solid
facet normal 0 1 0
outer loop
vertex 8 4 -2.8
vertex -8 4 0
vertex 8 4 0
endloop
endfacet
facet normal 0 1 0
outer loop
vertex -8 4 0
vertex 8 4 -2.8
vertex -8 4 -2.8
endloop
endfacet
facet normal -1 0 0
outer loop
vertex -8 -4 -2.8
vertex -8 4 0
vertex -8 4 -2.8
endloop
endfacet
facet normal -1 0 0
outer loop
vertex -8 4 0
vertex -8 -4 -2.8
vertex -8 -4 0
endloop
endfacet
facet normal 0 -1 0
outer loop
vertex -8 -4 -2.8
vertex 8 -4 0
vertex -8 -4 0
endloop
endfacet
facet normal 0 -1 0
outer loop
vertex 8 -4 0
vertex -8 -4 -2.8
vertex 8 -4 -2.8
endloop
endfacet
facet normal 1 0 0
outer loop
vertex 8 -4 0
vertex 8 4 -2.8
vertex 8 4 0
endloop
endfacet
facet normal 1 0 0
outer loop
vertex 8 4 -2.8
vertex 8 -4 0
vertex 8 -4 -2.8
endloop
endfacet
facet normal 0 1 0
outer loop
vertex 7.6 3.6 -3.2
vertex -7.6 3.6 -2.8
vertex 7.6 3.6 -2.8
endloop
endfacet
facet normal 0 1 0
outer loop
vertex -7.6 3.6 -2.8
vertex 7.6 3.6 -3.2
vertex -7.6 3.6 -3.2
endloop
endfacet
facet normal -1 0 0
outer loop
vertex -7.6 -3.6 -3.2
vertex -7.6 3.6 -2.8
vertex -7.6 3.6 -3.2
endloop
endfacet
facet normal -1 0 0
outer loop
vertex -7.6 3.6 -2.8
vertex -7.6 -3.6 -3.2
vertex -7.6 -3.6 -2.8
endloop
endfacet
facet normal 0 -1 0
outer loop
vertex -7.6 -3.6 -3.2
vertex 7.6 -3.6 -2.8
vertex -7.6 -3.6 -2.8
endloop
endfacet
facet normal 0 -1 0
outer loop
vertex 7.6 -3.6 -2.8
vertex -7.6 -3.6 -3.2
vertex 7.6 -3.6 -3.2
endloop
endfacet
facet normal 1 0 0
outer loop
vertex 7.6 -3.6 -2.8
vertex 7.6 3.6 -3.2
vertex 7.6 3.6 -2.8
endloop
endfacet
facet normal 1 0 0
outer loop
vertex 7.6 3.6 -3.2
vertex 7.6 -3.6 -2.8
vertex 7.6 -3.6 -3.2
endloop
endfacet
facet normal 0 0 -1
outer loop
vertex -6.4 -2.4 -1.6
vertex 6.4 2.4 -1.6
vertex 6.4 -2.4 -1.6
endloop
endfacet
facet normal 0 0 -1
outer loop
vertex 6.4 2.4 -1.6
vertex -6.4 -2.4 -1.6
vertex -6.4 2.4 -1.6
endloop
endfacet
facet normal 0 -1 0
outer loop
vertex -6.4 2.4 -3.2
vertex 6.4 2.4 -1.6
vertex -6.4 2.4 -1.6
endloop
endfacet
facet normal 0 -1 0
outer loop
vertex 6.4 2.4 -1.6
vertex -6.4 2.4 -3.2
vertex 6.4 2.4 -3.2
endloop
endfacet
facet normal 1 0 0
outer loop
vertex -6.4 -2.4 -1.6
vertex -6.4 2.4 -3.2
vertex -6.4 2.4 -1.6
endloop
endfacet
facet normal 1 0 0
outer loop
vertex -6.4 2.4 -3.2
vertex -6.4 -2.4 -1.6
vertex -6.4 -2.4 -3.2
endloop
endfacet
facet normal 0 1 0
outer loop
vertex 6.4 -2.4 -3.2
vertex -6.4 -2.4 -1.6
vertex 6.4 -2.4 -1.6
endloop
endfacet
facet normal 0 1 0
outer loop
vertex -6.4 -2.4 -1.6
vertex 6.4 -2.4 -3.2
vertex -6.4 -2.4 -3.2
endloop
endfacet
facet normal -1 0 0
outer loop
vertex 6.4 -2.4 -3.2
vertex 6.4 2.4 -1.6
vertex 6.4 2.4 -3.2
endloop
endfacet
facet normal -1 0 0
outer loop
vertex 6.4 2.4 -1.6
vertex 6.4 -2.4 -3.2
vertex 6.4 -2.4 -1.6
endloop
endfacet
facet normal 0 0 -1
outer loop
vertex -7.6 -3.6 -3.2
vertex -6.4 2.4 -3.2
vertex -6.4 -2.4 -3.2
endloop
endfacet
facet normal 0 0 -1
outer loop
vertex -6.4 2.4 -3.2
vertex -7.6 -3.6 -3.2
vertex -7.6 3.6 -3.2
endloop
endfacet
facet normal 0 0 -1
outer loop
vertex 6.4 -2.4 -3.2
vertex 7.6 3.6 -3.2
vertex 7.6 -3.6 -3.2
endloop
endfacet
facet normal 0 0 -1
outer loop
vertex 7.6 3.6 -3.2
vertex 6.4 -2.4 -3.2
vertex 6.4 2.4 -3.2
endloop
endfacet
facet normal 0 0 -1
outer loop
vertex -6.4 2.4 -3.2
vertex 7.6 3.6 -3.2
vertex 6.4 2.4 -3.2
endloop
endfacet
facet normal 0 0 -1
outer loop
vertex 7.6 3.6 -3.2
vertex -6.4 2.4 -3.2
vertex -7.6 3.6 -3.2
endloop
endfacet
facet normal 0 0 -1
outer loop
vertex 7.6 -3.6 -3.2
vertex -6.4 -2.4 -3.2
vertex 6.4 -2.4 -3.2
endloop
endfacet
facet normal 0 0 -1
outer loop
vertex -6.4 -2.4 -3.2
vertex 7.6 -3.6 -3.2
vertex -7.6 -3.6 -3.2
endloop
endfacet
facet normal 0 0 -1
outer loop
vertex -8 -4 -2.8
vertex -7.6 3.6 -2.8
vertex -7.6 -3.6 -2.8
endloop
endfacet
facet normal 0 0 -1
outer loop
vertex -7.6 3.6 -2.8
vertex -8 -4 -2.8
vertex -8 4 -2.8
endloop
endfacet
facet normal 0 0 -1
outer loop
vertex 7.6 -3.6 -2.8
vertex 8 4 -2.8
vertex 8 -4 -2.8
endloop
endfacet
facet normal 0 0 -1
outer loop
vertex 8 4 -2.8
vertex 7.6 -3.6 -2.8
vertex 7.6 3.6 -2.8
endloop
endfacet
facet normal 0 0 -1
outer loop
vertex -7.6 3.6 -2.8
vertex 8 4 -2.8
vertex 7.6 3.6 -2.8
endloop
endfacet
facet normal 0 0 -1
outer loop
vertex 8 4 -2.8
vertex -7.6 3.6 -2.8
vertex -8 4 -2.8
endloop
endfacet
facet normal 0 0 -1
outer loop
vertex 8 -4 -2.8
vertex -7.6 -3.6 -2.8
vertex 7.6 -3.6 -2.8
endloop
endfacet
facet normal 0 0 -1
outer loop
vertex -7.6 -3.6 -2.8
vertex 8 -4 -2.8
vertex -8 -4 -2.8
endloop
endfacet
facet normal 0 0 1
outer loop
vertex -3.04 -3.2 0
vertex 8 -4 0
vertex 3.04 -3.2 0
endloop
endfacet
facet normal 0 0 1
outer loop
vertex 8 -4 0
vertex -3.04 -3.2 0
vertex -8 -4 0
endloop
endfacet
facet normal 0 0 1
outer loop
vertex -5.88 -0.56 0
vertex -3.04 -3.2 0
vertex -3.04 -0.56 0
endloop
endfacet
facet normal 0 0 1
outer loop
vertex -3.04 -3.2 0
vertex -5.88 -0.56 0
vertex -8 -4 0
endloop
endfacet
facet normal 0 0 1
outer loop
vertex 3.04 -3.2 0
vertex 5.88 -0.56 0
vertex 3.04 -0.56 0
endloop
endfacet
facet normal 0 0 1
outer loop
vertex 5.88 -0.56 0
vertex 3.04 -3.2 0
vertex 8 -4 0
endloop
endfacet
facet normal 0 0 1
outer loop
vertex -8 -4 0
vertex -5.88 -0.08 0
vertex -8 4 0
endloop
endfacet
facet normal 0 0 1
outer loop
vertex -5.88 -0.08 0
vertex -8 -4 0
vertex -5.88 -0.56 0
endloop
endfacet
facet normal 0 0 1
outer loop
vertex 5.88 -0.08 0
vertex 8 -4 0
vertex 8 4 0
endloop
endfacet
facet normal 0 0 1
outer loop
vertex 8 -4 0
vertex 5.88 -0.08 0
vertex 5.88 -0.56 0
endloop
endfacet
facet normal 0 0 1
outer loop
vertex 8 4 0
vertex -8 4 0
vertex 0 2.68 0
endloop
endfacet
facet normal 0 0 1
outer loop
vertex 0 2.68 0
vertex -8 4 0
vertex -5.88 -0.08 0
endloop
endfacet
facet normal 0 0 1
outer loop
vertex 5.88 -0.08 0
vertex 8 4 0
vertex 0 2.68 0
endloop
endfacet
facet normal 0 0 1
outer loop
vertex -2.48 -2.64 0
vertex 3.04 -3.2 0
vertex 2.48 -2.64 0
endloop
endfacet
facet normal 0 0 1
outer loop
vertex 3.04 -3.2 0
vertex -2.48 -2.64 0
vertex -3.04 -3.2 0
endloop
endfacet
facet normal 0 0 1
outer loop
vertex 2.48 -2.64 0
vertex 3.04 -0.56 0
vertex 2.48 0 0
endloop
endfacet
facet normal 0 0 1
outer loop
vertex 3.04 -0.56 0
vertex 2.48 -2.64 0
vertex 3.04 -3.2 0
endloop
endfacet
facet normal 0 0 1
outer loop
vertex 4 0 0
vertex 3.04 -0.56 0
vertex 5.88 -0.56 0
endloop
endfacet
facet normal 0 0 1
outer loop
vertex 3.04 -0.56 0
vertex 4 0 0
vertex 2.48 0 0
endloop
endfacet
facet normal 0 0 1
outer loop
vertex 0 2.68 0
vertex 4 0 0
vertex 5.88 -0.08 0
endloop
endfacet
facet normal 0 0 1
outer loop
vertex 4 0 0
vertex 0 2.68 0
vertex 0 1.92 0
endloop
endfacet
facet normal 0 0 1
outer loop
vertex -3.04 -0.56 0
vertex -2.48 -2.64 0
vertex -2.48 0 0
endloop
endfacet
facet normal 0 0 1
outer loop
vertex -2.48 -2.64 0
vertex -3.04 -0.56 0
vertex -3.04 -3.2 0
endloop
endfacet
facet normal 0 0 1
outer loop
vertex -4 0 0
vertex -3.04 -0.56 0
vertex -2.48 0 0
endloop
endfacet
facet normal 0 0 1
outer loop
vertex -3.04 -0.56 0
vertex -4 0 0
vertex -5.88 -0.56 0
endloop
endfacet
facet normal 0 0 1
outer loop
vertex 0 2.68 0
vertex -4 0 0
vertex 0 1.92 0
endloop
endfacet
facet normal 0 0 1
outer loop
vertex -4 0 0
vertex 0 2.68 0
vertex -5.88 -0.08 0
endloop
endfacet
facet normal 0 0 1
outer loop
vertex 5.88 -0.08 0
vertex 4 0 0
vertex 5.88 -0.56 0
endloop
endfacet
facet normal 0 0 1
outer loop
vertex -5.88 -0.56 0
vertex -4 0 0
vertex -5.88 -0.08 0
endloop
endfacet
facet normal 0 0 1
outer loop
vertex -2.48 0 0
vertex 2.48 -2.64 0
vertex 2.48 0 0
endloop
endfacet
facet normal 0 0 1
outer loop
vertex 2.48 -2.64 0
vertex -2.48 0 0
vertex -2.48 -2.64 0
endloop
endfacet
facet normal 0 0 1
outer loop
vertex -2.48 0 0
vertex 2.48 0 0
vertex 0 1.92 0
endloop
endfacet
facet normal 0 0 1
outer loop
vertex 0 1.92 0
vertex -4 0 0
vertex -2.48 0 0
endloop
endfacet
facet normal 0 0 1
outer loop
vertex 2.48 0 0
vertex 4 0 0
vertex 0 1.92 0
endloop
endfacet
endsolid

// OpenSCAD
// file: ../p/box5.scad
use <../lib.scad>
function ldraw_lib__box5() = [
// 0 Box with 5 Faces and All Edges
// 0 Name: box5.dat
// 0 Author: James Jessiman
// 0 !LDRAW_ORG Primitive UPDATE 2012-01
// 0 !LICENSE Licensed under CC BY 2.0 and CC BY 4.0 : see CAreadme.txt
// 
// 0 BFC CERTIFY CCW
  [0,"BFC","CERTIFY"],
  [0,"BFC","CCW"],
// 
// 0 !HISTORY 2002-04-03 [sbliss] Modified for BFC compliance
// 0 !HISTORY 2002-04-25 [PTadmin] Official Update 2002-02
// 0 !HISTORY 2007-06-24 [PTadmin] Header formatted for Contributor Agreement
// 0 !HISTORY 2008-07-01 [PTadmin] Official Update 2008-01
// 0 !HISTORY 2012-02-16 [Philo] Changed to CCW
// 0 !HISTORY 2012-03-30 [PTadmin] Official Update 2012-01
// 
// 
// 2 24 1 1 1 -1 1 1
  [2,24,1,1,1,-1,1,1],
// 2 24 -1 1 1 -1 1 -1
  [2,24,-1,1,1,-1,1,-1],
// 2 24 -1 1 -1 1 1 -1
  [2,24,-1,1,-1,1,1,-1],
// 2 24 1 1 -1 1 1 1
  [2,24,1,1,-1,1,1,1],
// 2 24 1 0 1 -1 0 1
  [2,24,1,0,1,-1,0,1],
// 2 24 -1 0 1 -1 0 -1
  [2,24,-1,0,1,-1,0,-1],
// 2 24 -1 0 -1 1 0 -1
  [2,24,-1,0,-1,1,0,-1],
// 2 24 1 0 -1 1 0 1
  [2,24,1,0,-1,1,0,1],
// 2 24 1 0 1 1 1 1
  [2,24,1,0,1,1,1,1],
// 2 24 -1 0 1 -1 1 1
  [2,24,-1,0,1,-1,1,1],
// 2 24 1 0 -1 1 1 -1
  [2,24,1,0,-1,1,1,-1],
// 2 24 -1 0 -1 -1 1 -1
  [2,24,-1,0,-1,-1,1,-1],
// 4 16 -1 1 1 1 1 1 1 1 -1 -1 1 -1
  [4,16,-1,1,1,1,1,1,1,1,-1,-1,1,-1],
// 4 16 -1 1 1 -1 0 1 1 0 1 1 1 1
  [4,16,-1,1,1,-1,0,1,1,0,1,1,1,1],
// 4 16 -1 1 -1 -1 0 -1 -1 0 1 -1 1 1
  [4,16,-1,1,-1,-1,0,-1,-1,0,1,-1,1,1],
// 4 16 1 1 -1 1 0 -1 -1 0 -1 -1 1 -1
  [4,16,1,1,-1,1,0,-1,-1,0,-1,-1,1,-1],
// 4 16 1 1 1 1 0 1 1 0 -1 1 1 -1
  [4,16,1,1,1,1,0,1,1,0,-1,1,1,-1],
];
makepoly(ldraw_lib__box5(), line=0.2);
// file: ../p/box4.scad
use <../lib.scad>
function ldraw_lib__box4() = [
// 0 Box with 4 Faces (2 Parallel Pairs) and All Edges
// 0 Name: box4.dat
// 0 Author: James Jessiman
// 0 !LDRAW_ORG Primitive UPDATE 2012-01
// 0 !LICENSE Licensed under CC BY 2.0 and CC BY 4.0 : see CAreadme.txt
// 
// 0 BFC CERTIFY CCW
  [0,"BFC","CERTIFY"],
  [0,"BFC","CCW"],
// 
// 0 !HISTORY 2002-04-03 [sbliss] Modified for BFC compliance
// 0 !HISTORY 2002-04-25 [PTadmin] Official Update 2002-02
// 0 !HISTORY 2007-06-24 [PTadmin] Header formatted for Contributor Agreement
// 0 !HISTORY 2008-07-01 [PTadmin] Official Update 2008-01
// 0 !HISTORY 2012-02-16 [Philo] Changed to CCW
// 0 !HISTORY 2012-03-30 [PTadmin] Official Update 2012-01
// 
// 
// 2 24 1 1 1 -1 1 1
  [2,24,1,1,1,-1,1,1],
// 2 24 -1 1 1 -1 1 -1
  [2,24,-1,1,1,-1,1,-1],
// 2 24 -1 1 -1 1 1 -1
  [2,24,-1,1,-1,1,1,-1],
// 2 24 1 1 -1 1 1 1
  [2,24,1,1,-1,1,1,1],
// 2 24 1 0 1 -1 0 1
  [2,24,1,0,1,-1,0,1],
// 2 24 -1 0 1 -1 0 -1
  [2,24,-1,0,1,-1,0,-1],
// 2 24 -1 0 -1 1 0 -1
  [2,24,-1,0,-1,1,0,-1],
// 2 24 1 0 -1 1 0 1
  [2,24,1,0,-1,1,0,1],
// 2 24 1 0 1 1 1 1
  [2,24,1,0,1,1,1,1],
// 2 24 -1 0 1 -1 1 1
  [2,24,-1,0,1,-1,1,1],
// 2 24 1 0 -1 1 1 -1
  [2,24,1,0,-1,1,1,-1],
// 2 24 -1 0 -1 -1 1 -1
  [2,24,-1,0,-1,-1,1,-1],
// 4 16 -1 1 1 -1 0 1 1 0 1 1 1 1
  [4,16,-1,1,1,-1,0,1,1,0,1,1,1,1],
// 4 16 -1 1 -1 -1 0 -1 -1 0 1 -1 1 1
  [4,16,-1,1,-1,-1,0,-1,-1,0,1,-1,1,1],
// 4 16 1 1 -1 1 0 -1 -1 0 -1 -1 1 -1
  [4,16,1,1,-1,1,0,-1,-1,0,-1,-1,1,-1],
// 4 16 1 1 1 1 0 1 1 0 -1 1 1 -1
  [4,16,1,1,1,1,0,1,1,0,-1,1,1,-1],
];
makepoly(ldraw_lib__box4(), line=0.2);
// file: s/3069p13c.scad
use <../../lib.scad>
function ldraw_lib__s__3069p13c() = [
// 0 ~Tile  1 x  2 with Arrow Short Pattern - Arrow
// 0 Name: s\3069p13c.dat
// 0 Author: Alex Taylor [anathema]
// 0 !LDRAW_ORG Subpart UPDATE 2010-02
// 0 !LICENSE Licensed under CC BY 2.0 and CC BY 4.0 : see CAreadme.txt
// 
// 0 BFC CERTIFY CCW
  [0,"BFC","CERTIFY"],
  [0,"BFC","CCW"],
// 
// 0 !HISTORY 2010-07-05 [PTadmin] Official Update 2010-02
// 
// 
// 4 16 -6.2 0 -6.6 6.2 0 -6.6 6.2 0 0 -6.2 0 0
  [4,16,-6.2,0,-6.6,6.2,0,-6.6,6.2,0,0,-6.2,0,0],
// 3 16 -6.2 0 0 6.2 0 0 0 0 4.8
  [3,16,-6.2,0,0,6.2,0,0,0,0,4.8],
// 3 16 0 0 4.8 -10 0 0 -6.2 0 0
  [3,16,0,0,4.8,-10,0,0,-6.2,0,0],
// 3 16 6.2 0 0 10 0 0 0 0 4.8
  [3,16,6.2,0,0,10,0,0,0,0,4.8],
// 0
];
makepoly(ldraw_lib__s__3069p13c(), line=0.2);
// file: s/3069p13b.scad
use <../../lib.scad>
function ldraw_lib__s__3069p13b() = [
// 0 ~Tile  1 x  2 with Arrow Short Pattern - Border
// 0 Name: s\3069p13b.dat
// 0 Author: Alex Taylor [anathema]
// 0 !LDRAW_ORG Subpart UPDATE 2010-02
// 0 !LICENSE Licensed under CC BY 2.0 and CC BY 4.0 : see CAreadme.txt
// 
// 0 BFC CERTIFY CCW
  [0,"BFC","CERTIFY"],
  [0,"BFC","CCW"],
// 
// 0 !HISTORY 2010-07-05 [PTadmin] Official Update 2010-02
// 
// 
// 4 16 -7.6 0 -8 7.6 0 -8 6.2 0 -6.6 -6.2 0 -6.6
  [4,16,-7.6,0,-8,7.6,0,-8,6.2,0,-6.6,-6.2,0,-6.6],
// 4 16 6.2 0 0 6.2 0 -6.6 7.6 0 -8 7.6 0 -1.4
  [4,16,6.2,0,0,6.2,0,-6.6,7.6,0,-8,7.6,0,-1.4],
// 4 16 7.6 0 -1.4 14.7 0 -1.4 10 0 0 6.2 0 0
  [4,16,7.6,0,-1.4,14.7,0,-1.4,10,0,0,6.2,0,0],
// 4 16 0 0 4.8 10 0 0 14.7 0 -0.2 0 0 6.7
  [4,16,0,0,4.8,10,0,0,14.7,0,-0.2,0,0,6.7],
// 4 16 -7.6 0 -1.4 -7.6 0 -8 -6.2 0 -6.6 -6.2 0 0
  [4,16,-7.6,0,-1.4,-7.6,0,-8,-6.2,0,-6.6,-6.2,0,0],
// 4 16 -6.2 0 0 -10 0 0 -14.7 0 -1.4 -7.6 0 -1.4
  [4,16,-6.2,0,0,-10,0,0,-14.7,0,-1.4,-7.6,0,-1.4],
// 4 16 0 0 6.7 -14.7 0 -0.2 -10 0 0 0 0 4.8
  [4,16,0,0,6.7,-14.7,0,-0.2,-10,0,0,0,0,4.8],
// 3 16 14.7 0 -0.2 10 0 0 14.7 0 -1.4
  [3,16,14.7,0,-0.2,10,0,0,14.7,0,-1.4],
// 3 16 -14.7 0 -1.4 -10 0 0 -14.7 0 -0.2
  [3,16,-14.7,0,-1.4,-10,0,0,-14.7,0,-0.2],
// 0
];
makepoly(ldraw_lib__s__3069p13b(), line=0.2);
// file: s/3069p13a.scad
use <../../lib.scad>
function ldraw_lib__s__3069p13a() = [
// 0 ~Tile  1 x  2 with Arrow Short Pattern - Mask
// 0 Name: s\3069p13a.dat
// 0 Author: Alex Taylor [anathema]
// 0 !LDRAW_ORG Subpart UPDATE 2010-02
// 0 !LICENSE Licensed under CC BY 2.0 and CC BY 4.0 : see CAreadme.txt
// 
// 0 BFC CERTIFY CCW
  [0,"BFC","CERTIFY"],
  [0,"BFC","CCW"],
// 
// 0 !HISTORY 2010-07-05 [PTadmin] Official Update 2010-02
// 
// 
// 4 16 -20 0 -10 20 0 -10 7.6 0 -8 -7.6 0 -8
  [4,16,-20,0,-10,20,0,-10,7.6,0,-8,-7.6,0,-8],
// 4 16 -7.6 0 -8 -7.6 0 -1.4 -14.7 0 -1.4 -20 0 -10
  [4,16,-7.6,0,-8,-7.6,0,-1.4,-14.7,0,-1.4,-20,0,-10],
// 4 16 20 0 -10 14.7 0 -1.4 7.6 0 -1.4 7.6 0 -8
  [4,16,20,0,-10,14.7,0,-1.4,7.6,0,-1.4,7.6,0,-8],
// 4 16 -20 0 -10 -14.7 0 -1.4 -14.7 0 -0.2 -20 0 10
  [4,16,-20,0,-10,-14.7,0,-1.4,-14.7,0,-0.2,-20,0,10],
// 4 16 20 0 10 14.7 0 -0.2 14.7 0 -1.4 20 0 -10
  [4,16,20,0,10,14.7,0,-0.2,14.7,0,-1.4,20,0,-10],
// 3 16 20 0 10 -20 0 10 0 0 6.7
  [3,16,20,0,10,-20,0,10,0,0,6.7],
// 3 16 0 0 6.7 -20 0 10 -14.7 0 -0.2
  [3,16,0,0,6.7,-20,0,10,-14.7,0,-0.2],
// 3 16 14.7 0 -0.2 20 0 10 0 0 6.7
  [3,16,14.7,0,-0.2,20,0,10,0,0,6.7],
// 0
];
makepoly(ldraw_lib__s__3069p13a(), line=0.2);
// file: s/3069bs01.scad
use <../../lib.scad>
use <../../p/box4.scad>
use <../../p/box5.scad>
function ldraw_lib__s__3069bs01() = [
// 0 ~Tile  1 x  2 with Groove without Top Face
// 0 Name: s\3069bs01.dat
// 0 Author: Santeri Piippo [arezey]
// 0 !LDRAW_ORG Subpart UPDATE 2010-02
// 0 !LICENSE Licensed under CC BY 2.0 and CC BY 4.0 : see CAreadme.txt
// 
// 0 BFC CERTIFY CCW
  [0,"BFC","CERTIFY"],
  [0,"BFC","CCW"],
// 
// 0 !HISTORY 2010-07-05 [PTadmin] Official Update 2010-02
// 
// 
// 1 16 0 0 0 20 0 0 0 7 0 0 0 10 box4.dat
  [1,16,0,0,0,20,0,0,0,7,0,0,0,10, ldraw_lib__box4()],
// 1 16 0 7 0 19 0 0 0 1 0 0 0 9 box4.dat
  [1,16,0,7,0,19,0,0,0,1,0,0,0,9, ldraw_lib__box4()],
// 0 BFC INVERTNEXT
  [0,"BFC","INVERTNEXT"],
// 1 16 0 8 0 16 0 0 0 -4 0 0 0 6 box5.dat
  [1,16,0,8,0,16,0,0,0,-4,0,0,0,6, ldraw_lib__box5()],
// 4 16 -19 8 9 -16 8 6 -16 8 -6 -19 8 -9
  [4,16,-19,8,9,-16,8,6,-16,8,-6,-19,8,-9],
// 4 16 19 8 -9 16 8 -6 16 8 6 19 8 9
  [4,16,19,8,-9,16,8,-6,16,8,6,19,8,9],
// 4 16 19 8 9 16 8 6 -16 8 6 -19 8 9
  [4,16,19,8,9,16,8,6,-16,8,6,-19,8,9],
// 4 16 -19 8 -9 -16 8 -6 16 8 -6 19 8 -9
  [4,16,-19,8,-9,-16,8,-6,16,8,-6,19,8,-9],
// 4 16 -20 7 10 -19 7 9 -19 7 -9 -20 7 -10
  [4,16,-20,7,10,-19,7,9,-19,7,-9,-20,7,-10],
// 4 16 20 7 -10 19 7 -9 19 7 9 20 7 10
  [4,16,20,7,-10,19,7,-9,19,7,9,20,7,10],
// 4 16 20 7 10 19 7 9 -19 7 9 -20 7 10
  [4,16,20,7,10,19,7,9,-19,7,9,-20,7,10],
// 4 16 -20 7 -10 -19 7 -9 19 7 -9 20 7 -10
  [4,16,-20,7,-10,-19,7,-9,19,7,-9,20,7,-10],
// 0 //
];
makepoly(ldraw_lib__s__3069bs01(), line=0.2);
// main file
use <../lib.scad>
use <s/3069bs01.scad>
use <s/3069p13a.scad>
use <s/3069p13b.scad>
use <s/3069p13c.scad>
function ldraw_lib__3069bp15() = [
// 0 Tile  1 x  2 with Arrow Short DkRed with Silver Border Pattern
// 0 Name: 3069bp15.dat
// 0 Author: James Jessiman
// 0 !LDRAW_ORG Part UPDATE 2013-01
// 0 !LICENSE Licensed under CC BY 2.0 and CC BY 4.0 : see CAreadme.txt
// 
// 0 BFC CERTIFY CCW
  [0,"BFC","CERTIFY"],
  [0,"BFC","CCW"],
// 
// 0 !HISTORY 2007-06-13 [PTadmin] Header formatted for Contributor Agreement
// 0 !HISTORY 2008-07-01 [PTadmin] Official Update 2008-01
// 0 !HISTORY 2009-08-15 [anathema] Rebuilt using new subparts
// 0 !HISTORY 2009-08-19 [PTadmin] Renamed from 3069p15
// 0 !HISTORY 2010-07-05 [PTadmin] Official Update 2010-02
// 0 !HISTORY 2013-02-17 [MagFors] Changed colour 179 to 80 (printed silver)
// 0 !HISTORY 2013-07-21 [PTadmin] Official Update 2013-01
// 
// 
// 1 16 0 0 0 1 0 0 0 1 0 0 0 1 s\3069bs01.dat
  [1,16,0,0,0,1,0,0,0,1,0,0,0,1, ldraw_lib__s__3069bs01()],
// 1 16 0 0 0 1 0 0 0 1 0 0 0 1 s\3069p13a.dat
  [1,16,0,0,0,1,0,0,0,1,0,0,0,1, ldraw_lib__s__3069p13a()],
// 1 80 0 0 0 1 0 0 0 1 0 0 0 1 s\3069p13b.dat
  [1,80,0,0,0,1,0,0,0,1,0,0,0,1, ldraw_lib__s__3069p13b()],
// 1 320 0 0 0 1 0 0 0 1 0 0 0 1 s\3069p13c.dat
  [1,320,0,0,0,1,0,0,0,1,0,0,0,1, ldraw_lib__s__3069p13c()],
];
makepoly(ldraw_lib__3069bp15(), line=0.2);
